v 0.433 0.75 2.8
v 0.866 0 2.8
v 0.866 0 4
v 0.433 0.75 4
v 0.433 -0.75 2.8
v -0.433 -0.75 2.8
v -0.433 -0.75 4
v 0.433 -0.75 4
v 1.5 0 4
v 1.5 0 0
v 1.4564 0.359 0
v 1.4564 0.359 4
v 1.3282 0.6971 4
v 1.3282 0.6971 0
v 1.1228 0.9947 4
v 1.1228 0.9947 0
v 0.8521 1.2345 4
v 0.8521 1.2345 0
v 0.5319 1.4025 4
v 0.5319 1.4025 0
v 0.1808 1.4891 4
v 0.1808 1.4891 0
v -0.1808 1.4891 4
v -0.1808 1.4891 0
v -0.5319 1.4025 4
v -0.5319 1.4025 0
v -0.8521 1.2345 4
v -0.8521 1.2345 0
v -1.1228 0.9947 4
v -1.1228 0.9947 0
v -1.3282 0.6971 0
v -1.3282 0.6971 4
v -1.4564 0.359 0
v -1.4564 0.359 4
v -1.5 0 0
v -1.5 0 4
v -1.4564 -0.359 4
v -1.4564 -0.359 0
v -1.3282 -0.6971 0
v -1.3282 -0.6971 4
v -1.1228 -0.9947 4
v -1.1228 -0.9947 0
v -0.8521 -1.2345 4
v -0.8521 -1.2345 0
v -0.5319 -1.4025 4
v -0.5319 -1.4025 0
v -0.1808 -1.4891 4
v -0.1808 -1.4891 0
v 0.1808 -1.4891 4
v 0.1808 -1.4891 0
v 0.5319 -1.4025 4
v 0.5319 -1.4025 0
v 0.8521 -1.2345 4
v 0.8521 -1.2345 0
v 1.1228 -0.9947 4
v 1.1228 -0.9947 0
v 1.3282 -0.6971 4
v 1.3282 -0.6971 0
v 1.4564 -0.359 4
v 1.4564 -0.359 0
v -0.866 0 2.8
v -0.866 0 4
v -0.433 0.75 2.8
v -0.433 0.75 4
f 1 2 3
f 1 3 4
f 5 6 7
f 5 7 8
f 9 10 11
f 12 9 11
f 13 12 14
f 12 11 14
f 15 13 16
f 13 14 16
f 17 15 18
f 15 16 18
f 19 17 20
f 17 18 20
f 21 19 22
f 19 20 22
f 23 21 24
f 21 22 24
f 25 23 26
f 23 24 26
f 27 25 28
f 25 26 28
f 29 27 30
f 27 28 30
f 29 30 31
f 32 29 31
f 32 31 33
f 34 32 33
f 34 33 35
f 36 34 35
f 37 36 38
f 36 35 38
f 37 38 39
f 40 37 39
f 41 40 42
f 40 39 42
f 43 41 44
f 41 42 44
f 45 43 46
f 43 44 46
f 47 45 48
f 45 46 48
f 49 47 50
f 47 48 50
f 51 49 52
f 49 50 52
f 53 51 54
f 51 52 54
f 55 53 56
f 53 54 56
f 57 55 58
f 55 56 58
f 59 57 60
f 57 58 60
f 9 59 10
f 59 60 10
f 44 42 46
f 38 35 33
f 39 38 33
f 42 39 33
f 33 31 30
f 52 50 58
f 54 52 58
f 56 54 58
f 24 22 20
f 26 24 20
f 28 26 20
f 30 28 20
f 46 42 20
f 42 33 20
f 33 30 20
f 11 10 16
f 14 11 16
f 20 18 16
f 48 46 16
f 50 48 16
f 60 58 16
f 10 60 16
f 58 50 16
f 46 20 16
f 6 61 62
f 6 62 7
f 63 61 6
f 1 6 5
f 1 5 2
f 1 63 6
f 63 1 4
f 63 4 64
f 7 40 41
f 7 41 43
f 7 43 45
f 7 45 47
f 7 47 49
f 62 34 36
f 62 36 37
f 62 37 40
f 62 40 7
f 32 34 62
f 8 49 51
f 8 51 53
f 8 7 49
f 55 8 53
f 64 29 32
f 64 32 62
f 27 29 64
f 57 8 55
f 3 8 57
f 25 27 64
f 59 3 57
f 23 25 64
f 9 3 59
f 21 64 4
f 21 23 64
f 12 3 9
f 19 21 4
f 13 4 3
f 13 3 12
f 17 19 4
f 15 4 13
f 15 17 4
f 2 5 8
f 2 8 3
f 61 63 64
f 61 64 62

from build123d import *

# Parameters (mm, degrees)
S01_M3_HEADLESS_BODY_R       = 1.5
F_01_M3_HEADLESS_BODY_DEPTH  = 4
F_02_START                   = 2.8
F_02_1_5_MM_HEX_SOCKET_DEPTH = 1.3


with BuildPart() as part:
    # S01 - M3 headless body → 01 - M3 headless body (new body)
    with BuildSketch(Plane.XY):
        Circle(S01_M3_HEADLESS_BODY_R)
    extrude(amount=F_01_M3_HEADLESS_BODY_DEPTH)

    # S02 - 1.5 mm hex socket → 02 - 1.5 mm hex socket (cut)
    with BuildSketch(Plane.XY.offset(F_02_START)):
        Polygon((0.866025404, 0), (0.433012702, 0.75), (-0.433012702, 0.75), (-0.866025404, 0), (-0.433012702, -0.75), (0.433012702, -0.75), align=None)
    extrude(amount=F_02_1_5_MM_HEX_SOCKET_DEPTH, mode=Mode.SUBTRACT)


solid = part.part
